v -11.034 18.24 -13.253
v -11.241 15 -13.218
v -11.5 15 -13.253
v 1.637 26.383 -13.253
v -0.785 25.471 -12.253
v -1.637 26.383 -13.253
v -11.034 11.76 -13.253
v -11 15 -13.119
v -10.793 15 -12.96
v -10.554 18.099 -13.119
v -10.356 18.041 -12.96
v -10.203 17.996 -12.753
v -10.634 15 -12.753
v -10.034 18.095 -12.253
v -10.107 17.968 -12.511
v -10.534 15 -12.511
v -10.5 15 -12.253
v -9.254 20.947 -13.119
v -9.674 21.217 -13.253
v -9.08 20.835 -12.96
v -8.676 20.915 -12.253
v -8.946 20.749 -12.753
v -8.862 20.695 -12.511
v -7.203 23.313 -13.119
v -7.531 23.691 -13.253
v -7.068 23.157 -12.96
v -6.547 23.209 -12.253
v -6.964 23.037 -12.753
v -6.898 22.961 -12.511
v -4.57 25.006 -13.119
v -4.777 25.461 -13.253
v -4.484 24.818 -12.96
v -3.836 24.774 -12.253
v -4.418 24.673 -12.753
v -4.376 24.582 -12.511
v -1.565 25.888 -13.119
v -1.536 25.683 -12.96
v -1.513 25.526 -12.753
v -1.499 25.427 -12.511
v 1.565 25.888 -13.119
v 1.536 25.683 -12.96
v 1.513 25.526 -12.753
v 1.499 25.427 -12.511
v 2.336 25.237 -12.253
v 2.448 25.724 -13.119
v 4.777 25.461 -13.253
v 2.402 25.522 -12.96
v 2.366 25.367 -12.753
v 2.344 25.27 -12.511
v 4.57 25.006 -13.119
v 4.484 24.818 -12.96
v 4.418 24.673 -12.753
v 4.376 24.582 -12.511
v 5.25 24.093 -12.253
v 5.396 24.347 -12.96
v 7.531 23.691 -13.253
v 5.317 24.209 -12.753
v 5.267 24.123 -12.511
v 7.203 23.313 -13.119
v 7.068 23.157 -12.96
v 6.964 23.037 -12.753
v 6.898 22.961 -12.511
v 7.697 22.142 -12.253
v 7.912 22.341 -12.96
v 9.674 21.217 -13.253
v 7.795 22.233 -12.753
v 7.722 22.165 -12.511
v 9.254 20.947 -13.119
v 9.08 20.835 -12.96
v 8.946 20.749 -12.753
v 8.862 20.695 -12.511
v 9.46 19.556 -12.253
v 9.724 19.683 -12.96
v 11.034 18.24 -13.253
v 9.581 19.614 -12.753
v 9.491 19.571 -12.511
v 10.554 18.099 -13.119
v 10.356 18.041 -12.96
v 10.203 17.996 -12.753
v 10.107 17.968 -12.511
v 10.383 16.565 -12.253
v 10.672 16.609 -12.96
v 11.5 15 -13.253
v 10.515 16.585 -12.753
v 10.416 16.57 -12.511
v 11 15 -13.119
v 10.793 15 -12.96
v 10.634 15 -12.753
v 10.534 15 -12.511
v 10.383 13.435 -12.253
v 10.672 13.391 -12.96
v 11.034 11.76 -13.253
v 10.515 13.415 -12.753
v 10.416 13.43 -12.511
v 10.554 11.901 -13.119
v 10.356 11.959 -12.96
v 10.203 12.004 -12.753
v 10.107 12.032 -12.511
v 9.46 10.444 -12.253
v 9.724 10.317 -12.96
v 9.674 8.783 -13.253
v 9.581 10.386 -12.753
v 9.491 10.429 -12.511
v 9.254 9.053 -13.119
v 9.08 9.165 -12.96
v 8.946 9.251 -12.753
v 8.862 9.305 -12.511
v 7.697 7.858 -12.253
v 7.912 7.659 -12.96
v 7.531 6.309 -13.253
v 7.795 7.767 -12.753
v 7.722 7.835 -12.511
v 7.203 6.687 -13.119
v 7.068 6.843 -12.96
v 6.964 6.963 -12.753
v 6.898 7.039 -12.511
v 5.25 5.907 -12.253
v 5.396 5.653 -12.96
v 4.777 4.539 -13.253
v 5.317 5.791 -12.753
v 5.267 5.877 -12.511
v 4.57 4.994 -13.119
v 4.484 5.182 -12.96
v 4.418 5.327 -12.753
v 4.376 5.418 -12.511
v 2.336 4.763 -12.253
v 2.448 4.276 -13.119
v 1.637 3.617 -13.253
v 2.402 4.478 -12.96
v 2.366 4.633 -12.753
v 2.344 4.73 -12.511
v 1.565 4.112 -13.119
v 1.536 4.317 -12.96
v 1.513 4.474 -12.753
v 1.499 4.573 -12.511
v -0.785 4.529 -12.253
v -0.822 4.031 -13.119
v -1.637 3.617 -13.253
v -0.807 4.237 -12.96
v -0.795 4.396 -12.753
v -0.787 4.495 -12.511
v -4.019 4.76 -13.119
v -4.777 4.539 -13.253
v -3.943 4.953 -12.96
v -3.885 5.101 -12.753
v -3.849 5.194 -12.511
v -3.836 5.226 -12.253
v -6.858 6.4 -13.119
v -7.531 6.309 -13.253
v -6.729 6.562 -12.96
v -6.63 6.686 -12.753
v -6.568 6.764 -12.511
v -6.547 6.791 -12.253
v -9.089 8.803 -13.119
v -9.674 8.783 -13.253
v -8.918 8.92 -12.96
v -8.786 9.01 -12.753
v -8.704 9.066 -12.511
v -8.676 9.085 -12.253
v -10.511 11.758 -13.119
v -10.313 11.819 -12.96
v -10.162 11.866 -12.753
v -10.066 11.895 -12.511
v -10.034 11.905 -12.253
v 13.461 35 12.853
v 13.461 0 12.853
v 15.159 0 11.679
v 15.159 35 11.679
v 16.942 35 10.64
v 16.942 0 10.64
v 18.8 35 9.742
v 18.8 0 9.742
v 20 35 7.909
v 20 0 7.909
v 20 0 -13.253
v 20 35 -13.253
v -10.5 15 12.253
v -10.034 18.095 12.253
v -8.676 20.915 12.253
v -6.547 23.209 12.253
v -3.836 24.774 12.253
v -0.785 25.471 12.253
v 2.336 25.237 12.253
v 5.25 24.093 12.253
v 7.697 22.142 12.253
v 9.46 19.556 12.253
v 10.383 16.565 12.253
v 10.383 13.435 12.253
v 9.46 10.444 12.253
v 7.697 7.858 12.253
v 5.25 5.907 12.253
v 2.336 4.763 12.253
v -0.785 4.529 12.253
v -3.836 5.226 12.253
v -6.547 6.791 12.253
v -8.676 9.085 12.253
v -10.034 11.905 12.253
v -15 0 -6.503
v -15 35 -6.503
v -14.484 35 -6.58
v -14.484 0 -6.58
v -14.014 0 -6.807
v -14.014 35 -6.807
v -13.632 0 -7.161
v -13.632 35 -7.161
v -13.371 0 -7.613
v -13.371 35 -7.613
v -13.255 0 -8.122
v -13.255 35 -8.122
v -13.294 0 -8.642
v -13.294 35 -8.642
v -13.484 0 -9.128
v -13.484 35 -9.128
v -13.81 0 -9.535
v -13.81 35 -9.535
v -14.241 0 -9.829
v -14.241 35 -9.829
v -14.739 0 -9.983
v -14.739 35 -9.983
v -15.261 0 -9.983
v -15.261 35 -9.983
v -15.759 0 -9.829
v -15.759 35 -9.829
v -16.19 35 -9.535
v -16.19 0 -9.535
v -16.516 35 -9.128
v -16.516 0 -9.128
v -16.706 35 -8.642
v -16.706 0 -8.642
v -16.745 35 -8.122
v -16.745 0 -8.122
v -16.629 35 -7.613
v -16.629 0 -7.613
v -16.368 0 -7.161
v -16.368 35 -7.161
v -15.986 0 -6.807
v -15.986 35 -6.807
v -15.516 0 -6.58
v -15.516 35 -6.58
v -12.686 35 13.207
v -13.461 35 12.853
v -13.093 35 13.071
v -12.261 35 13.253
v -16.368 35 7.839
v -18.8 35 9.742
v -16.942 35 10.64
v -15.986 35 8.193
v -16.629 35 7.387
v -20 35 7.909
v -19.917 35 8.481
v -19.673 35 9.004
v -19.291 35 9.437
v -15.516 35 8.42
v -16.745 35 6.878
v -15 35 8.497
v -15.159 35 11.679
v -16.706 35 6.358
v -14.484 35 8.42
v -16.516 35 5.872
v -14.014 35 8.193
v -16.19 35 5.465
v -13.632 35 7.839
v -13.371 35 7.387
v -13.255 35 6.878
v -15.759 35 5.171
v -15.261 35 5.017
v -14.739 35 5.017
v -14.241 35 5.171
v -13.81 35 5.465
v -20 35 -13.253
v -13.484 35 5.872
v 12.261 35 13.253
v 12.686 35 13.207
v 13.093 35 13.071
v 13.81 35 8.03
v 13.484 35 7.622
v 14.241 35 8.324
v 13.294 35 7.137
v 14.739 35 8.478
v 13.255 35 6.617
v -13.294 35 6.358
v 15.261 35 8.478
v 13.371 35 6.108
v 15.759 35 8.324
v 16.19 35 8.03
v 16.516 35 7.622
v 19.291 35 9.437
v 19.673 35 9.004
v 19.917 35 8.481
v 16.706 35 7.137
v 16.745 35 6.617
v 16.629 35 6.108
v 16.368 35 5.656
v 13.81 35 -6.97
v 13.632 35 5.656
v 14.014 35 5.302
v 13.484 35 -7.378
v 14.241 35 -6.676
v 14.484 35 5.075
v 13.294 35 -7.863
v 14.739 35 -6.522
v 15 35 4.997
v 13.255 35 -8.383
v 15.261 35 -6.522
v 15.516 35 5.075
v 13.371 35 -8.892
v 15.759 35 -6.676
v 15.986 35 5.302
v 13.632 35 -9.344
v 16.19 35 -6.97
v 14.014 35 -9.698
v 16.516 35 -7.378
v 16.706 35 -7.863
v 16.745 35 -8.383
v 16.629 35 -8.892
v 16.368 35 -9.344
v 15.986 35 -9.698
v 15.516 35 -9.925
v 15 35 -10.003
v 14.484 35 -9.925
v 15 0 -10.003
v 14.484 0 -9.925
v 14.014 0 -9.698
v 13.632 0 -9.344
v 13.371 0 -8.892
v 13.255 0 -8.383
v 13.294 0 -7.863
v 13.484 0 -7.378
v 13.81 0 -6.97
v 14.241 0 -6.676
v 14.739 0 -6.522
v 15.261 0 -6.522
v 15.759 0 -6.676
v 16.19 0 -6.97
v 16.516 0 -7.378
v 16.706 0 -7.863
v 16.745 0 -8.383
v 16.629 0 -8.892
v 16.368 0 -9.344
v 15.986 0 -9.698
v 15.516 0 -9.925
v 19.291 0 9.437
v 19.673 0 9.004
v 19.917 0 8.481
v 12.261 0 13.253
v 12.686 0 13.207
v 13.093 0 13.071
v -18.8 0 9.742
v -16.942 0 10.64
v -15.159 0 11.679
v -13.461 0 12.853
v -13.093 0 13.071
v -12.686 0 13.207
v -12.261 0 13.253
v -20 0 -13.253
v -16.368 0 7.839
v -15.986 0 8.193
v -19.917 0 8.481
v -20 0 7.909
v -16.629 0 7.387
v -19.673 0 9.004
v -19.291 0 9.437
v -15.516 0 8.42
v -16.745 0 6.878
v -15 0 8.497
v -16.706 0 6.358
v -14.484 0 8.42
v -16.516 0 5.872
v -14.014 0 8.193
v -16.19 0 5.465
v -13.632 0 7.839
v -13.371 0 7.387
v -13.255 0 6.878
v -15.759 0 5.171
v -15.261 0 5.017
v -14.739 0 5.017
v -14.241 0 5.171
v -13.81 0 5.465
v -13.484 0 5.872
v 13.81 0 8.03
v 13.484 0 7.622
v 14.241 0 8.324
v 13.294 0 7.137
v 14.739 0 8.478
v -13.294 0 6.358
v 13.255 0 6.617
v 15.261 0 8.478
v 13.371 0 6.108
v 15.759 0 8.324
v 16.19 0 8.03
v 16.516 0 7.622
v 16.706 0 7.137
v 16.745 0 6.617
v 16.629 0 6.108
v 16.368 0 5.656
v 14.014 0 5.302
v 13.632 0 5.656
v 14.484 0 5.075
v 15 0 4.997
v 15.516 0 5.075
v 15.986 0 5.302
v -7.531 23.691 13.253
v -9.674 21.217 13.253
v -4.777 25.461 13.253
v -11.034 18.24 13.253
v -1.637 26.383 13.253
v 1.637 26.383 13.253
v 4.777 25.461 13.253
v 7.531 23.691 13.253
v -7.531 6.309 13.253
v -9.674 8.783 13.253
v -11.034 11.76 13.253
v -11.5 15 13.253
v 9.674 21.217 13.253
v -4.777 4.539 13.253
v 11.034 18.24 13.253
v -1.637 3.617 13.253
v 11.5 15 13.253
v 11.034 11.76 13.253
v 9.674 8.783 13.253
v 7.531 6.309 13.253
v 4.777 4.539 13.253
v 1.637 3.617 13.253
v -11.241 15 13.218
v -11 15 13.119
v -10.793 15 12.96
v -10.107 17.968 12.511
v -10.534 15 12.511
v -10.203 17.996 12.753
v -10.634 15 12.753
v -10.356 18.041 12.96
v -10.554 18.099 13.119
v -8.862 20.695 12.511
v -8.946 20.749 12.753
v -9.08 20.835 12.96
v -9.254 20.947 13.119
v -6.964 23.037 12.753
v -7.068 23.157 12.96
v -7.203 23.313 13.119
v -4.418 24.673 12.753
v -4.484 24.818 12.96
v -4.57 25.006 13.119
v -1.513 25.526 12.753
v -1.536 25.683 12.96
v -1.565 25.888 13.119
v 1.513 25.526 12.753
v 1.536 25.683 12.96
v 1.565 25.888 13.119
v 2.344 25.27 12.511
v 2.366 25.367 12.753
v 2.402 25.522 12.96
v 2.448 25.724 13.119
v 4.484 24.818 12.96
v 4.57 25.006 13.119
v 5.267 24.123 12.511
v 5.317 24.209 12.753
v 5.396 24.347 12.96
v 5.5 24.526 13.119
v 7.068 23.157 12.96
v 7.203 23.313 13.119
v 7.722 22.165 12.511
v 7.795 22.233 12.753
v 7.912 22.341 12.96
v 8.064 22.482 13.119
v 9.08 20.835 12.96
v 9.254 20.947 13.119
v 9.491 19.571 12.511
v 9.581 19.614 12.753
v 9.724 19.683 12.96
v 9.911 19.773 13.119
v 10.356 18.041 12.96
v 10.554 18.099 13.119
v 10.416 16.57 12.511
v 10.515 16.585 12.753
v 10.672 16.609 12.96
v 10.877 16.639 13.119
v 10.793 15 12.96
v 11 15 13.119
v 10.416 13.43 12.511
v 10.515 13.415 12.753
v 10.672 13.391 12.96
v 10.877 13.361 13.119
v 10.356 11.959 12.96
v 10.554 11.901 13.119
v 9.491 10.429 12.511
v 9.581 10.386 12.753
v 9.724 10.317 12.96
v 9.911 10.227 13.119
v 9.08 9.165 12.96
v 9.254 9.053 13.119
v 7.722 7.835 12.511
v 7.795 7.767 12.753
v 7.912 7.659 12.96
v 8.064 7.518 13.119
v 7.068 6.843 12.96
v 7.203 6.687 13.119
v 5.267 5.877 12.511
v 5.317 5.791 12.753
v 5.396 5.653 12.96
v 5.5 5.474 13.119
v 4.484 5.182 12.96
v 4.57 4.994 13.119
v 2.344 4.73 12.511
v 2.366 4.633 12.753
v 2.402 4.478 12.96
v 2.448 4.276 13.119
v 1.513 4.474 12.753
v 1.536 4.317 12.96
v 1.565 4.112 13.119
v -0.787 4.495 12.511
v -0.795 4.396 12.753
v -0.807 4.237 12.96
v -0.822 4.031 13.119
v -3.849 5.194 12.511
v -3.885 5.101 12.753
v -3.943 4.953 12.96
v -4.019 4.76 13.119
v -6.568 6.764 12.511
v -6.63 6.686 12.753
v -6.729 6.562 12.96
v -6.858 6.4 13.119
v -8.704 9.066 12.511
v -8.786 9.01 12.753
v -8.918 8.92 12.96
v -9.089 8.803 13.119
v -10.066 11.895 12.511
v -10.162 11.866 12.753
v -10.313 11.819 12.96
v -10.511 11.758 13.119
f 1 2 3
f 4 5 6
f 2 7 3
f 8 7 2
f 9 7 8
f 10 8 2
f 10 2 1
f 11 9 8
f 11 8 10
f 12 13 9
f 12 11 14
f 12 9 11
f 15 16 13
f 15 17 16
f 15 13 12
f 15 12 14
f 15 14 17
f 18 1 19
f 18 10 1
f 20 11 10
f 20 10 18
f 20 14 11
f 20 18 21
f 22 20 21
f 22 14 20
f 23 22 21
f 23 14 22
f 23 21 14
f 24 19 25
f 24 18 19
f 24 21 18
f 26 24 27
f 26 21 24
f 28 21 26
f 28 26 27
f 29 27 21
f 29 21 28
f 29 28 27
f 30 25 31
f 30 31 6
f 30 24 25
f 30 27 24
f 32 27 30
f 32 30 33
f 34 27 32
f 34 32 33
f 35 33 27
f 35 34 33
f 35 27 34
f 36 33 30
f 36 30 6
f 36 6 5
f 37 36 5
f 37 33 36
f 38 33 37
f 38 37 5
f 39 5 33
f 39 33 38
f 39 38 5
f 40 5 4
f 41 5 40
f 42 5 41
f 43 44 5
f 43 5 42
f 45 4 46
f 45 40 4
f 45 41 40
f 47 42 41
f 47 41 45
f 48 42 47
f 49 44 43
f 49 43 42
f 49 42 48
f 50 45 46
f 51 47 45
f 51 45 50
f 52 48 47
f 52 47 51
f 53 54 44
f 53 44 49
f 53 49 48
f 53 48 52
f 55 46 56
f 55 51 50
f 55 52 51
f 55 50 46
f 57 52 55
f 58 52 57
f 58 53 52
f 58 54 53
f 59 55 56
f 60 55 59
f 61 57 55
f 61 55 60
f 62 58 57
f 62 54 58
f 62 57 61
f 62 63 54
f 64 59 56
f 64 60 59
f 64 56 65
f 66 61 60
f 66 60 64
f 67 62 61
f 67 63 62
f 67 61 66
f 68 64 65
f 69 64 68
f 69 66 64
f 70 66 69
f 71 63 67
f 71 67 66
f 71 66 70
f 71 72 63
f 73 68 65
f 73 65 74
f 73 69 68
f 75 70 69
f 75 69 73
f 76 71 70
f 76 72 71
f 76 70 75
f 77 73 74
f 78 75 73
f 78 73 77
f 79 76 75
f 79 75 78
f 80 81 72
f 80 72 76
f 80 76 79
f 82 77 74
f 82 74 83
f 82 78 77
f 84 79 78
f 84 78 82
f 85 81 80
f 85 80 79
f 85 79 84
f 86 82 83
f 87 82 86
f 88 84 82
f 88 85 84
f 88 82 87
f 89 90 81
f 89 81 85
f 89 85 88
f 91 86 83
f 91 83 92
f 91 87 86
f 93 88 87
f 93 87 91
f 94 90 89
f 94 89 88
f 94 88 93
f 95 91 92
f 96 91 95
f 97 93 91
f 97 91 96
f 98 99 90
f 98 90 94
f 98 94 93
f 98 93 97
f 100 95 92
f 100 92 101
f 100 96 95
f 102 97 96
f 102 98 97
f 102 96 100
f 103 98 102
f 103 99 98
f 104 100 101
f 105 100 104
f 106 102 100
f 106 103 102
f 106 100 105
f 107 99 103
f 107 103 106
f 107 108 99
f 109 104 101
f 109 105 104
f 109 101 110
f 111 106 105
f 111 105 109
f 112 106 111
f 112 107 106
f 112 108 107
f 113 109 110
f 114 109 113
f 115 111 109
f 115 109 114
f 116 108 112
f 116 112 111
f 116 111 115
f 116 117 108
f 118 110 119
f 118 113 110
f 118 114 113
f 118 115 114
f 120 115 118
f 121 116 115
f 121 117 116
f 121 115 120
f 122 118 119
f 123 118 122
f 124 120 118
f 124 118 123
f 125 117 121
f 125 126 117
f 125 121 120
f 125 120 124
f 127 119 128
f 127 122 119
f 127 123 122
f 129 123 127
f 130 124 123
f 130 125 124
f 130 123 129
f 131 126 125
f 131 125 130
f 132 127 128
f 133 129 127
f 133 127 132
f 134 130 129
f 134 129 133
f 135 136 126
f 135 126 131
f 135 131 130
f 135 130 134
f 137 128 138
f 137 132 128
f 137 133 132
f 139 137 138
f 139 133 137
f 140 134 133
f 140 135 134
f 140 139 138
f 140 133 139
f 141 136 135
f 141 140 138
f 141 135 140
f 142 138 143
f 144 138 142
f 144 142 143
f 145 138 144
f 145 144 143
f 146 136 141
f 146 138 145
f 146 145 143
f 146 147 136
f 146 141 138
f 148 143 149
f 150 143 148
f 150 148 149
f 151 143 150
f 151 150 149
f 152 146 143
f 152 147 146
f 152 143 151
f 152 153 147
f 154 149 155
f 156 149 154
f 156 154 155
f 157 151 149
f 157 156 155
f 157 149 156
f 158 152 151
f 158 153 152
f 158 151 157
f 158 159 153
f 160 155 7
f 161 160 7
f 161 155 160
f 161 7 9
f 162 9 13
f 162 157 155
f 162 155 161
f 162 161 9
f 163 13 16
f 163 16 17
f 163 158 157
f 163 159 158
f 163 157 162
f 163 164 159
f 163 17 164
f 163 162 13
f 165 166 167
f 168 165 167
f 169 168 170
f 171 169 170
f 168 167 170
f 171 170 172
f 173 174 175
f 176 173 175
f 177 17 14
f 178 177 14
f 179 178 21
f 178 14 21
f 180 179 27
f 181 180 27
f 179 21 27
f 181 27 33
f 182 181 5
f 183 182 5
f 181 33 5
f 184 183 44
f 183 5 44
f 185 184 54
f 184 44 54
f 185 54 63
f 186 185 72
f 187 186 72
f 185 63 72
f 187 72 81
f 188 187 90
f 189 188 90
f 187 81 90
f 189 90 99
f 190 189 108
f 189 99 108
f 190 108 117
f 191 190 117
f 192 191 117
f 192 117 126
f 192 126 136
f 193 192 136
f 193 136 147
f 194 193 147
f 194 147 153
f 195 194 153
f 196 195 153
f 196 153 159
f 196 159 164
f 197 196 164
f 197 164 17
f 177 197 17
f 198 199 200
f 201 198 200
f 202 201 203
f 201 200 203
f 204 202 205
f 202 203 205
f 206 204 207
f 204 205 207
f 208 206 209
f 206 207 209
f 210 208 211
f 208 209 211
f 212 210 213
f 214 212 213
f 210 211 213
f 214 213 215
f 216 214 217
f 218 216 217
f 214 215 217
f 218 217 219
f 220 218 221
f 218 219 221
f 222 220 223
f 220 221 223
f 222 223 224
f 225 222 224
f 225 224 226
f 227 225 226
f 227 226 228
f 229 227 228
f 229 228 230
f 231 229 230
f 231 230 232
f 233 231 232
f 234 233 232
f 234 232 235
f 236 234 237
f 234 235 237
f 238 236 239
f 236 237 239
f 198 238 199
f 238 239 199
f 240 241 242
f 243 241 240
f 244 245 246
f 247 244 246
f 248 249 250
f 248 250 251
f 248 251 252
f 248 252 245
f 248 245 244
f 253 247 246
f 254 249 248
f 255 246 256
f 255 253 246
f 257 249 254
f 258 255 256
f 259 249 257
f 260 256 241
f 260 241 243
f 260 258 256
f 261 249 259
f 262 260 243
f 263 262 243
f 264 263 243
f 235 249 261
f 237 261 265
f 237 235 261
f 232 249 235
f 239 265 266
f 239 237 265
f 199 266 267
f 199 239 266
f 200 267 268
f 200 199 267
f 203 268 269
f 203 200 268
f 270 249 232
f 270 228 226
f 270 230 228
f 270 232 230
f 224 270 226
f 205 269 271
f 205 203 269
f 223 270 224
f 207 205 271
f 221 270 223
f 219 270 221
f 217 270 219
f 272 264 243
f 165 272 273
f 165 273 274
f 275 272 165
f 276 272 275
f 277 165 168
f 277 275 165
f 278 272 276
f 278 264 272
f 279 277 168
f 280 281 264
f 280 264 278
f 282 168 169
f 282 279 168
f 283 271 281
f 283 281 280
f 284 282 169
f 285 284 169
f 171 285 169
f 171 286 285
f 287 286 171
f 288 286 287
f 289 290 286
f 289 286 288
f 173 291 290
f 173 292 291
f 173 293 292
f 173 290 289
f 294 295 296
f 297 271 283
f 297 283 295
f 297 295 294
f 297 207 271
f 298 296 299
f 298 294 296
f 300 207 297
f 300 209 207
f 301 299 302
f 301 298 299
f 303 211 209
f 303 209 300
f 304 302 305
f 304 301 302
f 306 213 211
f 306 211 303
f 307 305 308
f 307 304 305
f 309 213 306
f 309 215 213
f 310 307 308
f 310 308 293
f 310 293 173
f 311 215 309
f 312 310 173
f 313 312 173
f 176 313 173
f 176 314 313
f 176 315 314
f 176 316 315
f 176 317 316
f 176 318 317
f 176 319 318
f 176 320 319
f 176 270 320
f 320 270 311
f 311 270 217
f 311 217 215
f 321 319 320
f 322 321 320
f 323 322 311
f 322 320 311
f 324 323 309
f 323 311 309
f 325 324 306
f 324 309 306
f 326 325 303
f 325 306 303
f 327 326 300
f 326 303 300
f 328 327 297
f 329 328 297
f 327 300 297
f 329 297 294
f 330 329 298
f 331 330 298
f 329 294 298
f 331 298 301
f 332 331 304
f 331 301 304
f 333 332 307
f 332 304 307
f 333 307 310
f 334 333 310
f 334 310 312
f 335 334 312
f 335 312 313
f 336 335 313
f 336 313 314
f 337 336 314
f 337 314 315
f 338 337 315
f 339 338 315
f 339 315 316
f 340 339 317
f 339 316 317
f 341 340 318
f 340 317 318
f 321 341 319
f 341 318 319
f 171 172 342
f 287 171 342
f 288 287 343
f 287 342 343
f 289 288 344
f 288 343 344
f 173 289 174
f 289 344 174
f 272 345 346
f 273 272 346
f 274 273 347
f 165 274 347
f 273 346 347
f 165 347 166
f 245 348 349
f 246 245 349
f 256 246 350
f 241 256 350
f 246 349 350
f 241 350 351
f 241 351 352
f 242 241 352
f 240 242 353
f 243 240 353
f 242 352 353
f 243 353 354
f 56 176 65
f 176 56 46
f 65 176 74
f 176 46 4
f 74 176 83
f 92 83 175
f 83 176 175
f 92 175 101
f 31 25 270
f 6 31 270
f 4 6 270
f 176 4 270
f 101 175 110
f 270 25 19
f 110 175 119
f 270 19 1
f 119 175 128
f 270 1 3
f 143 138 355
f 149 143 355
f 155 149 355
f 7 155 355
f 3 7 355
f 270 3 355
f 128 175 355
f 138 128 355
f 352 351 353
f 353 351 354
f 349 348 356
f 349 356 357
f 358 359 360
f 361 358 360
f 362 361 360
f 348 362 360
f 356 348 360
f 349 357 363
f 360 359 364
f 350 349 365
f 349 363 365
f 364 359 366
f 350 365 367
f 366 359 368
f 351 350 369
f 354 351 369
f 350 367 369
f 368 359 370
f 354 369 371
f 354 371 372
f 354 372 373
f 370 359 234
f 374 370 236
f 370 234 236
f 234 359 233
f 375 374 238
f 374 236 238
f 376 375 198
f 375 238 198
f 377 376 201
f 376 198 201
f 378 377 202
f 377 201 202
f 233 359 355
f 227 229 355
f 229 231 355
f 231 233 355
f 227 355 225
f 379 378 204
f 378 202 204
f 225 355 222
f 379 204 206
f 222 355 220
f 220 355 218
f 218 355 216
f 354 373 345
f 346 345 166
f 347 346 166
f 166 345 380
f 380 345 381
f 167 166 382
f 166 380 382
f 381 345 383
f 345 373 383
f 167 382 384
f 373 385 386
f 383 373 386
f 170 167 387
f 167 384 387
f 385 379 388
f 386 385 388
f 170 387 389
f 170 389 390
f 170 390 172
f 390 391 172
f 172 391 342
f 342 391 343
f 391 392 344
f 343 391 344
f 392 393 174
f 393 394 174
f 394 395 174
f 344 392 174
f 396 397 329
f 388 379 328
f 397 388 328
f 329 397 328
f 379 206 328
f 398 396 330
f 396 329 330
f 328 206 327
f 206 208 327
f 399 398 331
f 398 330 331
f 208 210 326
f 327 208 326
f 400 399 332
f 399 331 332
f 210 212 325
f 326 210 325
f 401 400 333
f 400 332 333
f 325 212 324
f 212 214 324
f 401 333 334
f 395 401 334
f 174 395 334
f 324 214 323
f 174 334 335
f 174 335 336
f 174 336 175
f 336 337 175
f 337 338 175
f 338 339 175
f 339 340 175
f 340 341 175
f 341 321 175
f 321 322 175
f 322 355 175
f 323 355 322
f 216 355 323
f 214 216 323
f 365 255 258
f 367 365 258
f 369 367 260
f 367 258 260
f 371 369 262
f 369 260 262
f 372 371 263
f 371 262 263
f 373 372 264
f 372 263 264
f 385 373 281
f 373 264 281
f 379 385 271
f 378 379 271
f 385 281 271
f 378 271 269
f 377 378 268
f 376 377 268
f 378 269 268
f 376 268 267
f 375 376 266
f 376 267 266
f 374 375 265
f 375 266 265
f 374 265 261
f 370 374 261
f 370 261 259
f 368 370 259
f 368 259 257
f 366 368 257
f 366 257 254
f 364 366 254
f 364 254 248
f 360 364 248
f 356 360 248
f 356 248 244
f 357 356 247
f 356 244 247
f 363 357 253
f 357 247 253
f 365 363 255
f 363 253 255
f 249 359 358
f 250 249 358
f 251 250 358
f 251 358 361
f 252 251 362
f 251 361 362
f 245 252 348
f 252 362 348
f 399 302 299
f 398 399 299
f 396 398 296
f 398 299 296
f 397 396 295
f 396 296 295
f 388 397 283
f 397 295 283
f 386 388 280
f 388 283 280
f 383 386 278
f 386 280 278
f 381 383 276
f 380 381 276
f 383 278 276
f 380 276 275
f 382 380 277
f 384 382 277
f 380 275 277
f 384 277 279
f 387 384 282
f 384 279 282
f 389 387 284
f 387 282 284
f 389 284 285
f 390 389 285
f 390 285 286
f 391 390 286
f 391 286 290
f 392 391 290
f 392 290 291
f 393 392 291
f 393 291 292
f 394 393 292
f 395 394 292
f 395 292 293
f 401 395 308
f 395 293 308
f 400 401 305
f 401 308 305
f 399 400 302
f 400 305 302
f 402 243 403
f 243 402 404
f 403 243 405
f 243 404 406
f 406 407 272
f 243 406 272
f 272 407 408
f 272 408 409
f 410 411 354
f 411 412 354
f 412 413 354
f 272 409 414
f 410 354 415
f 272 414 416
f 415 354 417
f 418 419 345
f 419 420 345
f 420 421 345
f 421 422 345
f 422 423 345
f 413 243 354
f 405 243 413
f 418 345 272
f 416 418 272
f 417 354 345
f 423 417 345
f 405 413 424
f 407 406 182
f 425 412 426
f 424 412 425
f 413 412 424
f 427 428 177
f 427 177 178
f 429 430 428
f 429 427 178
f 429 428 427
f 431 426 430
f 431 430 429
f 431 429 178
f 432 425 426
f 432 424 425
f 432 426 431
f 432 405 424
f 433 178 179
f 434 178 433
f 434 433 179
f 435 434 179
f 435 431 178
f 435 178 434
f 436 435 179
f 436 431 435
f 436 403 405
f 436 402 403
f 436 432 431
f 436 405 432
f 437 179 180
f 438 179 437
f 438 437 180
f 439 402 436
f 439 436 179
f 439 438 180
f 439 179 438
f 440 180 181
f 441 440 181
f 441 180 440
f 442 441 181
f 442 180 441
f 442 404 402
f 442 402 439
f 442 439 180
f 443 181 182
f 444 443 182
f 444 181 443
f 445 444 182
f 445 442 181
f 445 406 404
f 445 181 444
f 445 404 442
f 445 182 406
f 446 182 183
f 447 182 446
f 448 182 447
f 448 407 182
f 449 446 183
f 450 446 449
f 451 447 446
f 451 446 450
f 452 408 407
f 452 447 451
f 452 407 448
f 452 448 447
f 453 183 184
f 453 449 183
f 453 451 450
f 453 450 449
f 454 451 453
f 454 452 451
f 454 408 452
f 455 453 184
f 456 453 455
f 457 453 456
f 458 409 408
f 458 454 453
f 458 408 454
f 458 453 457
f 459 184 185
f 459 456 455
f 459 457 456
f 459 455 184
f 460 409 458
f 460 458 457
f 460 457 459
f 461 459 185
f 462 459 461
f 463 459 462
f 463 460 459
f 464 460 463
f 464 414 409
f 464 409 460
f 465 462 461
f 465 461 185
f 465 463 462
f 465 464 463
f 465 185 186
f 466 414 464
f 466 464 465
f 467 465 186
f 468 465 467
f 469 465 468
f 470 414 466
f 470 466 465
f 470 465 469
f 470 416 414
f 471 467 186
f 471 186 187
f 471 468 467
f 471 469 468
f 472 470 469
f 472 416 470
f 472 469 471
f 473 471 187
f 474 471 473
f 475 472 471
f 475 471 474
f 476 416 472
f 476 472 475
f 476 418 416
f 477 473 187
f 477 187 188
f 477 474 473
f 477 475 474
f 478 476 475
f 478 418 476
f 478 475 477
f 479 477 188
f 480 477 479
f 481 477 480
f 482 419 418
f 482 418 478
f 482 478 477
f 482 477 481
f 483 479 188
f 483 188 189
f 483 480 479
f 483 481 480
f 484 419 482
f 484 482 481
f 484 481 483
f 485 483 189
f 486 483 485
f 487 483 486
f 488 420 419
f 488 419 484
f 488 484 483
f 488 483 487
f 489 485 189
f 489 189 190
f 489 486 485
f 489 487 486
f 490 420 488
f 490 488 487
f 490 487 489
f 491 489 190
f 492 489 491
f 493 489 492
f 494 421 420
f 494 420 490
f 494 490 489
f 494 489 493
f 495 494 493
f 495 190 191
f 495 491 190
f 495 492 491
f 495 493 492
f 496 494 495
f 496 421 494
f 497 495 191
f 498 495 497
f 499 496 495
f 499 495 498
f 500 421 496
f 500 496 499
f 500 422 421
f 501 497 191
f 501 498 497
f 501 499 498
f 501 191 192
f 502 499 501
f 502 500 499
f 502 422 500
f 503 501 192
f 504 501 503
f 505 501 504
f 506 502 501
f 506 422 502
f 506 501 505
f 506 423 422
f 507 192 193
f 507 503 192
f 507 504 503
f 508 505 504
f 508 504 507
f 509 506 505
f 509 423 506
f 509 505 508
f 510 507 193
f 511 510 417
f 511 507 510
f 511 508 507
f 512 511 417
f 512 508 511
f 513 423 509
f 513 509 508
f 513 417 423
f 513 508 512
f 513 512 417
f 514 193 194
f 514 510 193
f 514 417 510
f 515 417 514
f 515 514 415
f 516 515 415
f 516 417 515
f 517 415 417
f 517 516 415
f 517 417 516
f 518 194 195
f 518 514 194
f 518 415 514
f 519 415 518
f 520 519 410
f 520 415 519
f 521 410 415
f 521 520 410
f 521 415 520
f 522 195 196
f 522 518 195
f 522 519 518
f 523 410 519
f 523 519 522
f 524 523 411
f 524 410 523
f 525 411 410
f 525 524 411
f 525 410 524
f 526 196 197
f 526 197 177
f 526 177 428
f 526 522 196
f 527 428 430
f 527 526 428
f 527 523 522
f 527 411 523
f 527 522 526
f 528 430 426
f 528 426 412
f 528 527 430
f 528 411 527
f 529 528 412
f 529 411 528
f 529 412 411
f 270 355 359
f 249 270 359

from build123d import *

# Parameters (mm, degrees)
F_35MM_DEPTH          = 35
CUT_EXTRUDE_1_REACH   = 50.244
SKETCH_2_R            = 10.5
FILLET_1_R            = 1
SKETCH_3_R            = 1.75
CUT_EXTRUDE_3_1_DEPTH = 35


with BuildPart() as part:
    # 草图1 → 高35mm (new body)
    with BuildSketch(Plane(origin=(0, 0, 0), x_dir=(1, 0, 0), z_dir=(0, 1, 0))):
        with BuildLine():
            Line((-20, 13.25250025), (-20, -7.909163894))
            ThreePointArc((-20, -7.909163894), (-19.67340752, -9.004475389), (-18.800292729, -9.742066387))
            ThreePointArc((-18.800292729, -9.742066387), (-16.040253129, -11.142625499), (-13.460543724, -12.852737719))
            ThreePointArc((-13.460543724, -12.852737719), (-12.893128183, -13.149929424), (-12.260860414, -13.25250025))
            Line((-12.260860414, -13.25250025), (12.260860414, -13.25250025))
            ThreePointArc((12.260860414, -13.25250025), (12.893128183, -13.149929424), (13.460543724, -12.852737719))
            ThreePointArc((13.460543724, -12.852737719), (16.040253129, -11.142625499), (18.800292729, -9.742066387))
            ThreePointArc((18.800292729, -9.742066387), (19.67340752, -9.004475389), (20, -7.909163894))
            Line((20, -7.909163894), (20, 13.25250025))
            Line((20, 13.25250025), (-20, 13.25250025))
        make_face()
    extrude(amount=F_35MM_DEPTH)

    # 草图2 → 切除-拉伸1 (cut, up to next)
    with BuildSketch(Plane(origin=(0, 0, -13.25250025), x_dir=(-1, 0, 0), z_dir=(0, 0, -1)), mode=Mode.PRIVATE) as cut_extrude_1_sk1:
        with Locations((0, 15)):
            Circle(SKETCH_2_R)
    cut_extrude_1_tool1 = extrude(cut_extrude_1_sk1.sketch, amount=-CUT_EXTRUDE_1_REACH, mode=Mode.PRIVATE) & part.part
    add(cut_extrude_1_tool1.solids().sort_by_distance((0, 15, -13.2525))[0], mode=Mode.SUBTRACT)

    # 圆角1
    fillet_1_edges = [part.edges().sort_by_distance(p)[0] for p in [
        (10.5, 15, -13.25250025),
        (10.5, 15, 13.25250025),
    ]]
    fillet(fillet_1_edges, radius=FILLET_1_R)

    # 草图3 → φ3.1通孔 (cut)
    with BuildSketch(Plane(origin=(0, 35, 0), x_dir=(1, 0, 0), z_dir=(0, 1, 0))):
        with Locations(Location((-15, 8.25250025, 0), (0, 0, 270))):
            Circle(SKETCH_3_R)
        with Locations(Location((-15, -6.74749975, 0), (0, 0, 270))):
            Circle(SKETCH_3_R)
        with Locations(Location((15, -6.74749975, 0), (0, 0, 90))):
            Circle(SKETCH_3_R)
        with Locations(Location((15, 8.25250025, 0), (0, 0, 90))):
            Circle(SKETCH_3_R)
    extrude(amount=-CUT_EXTRUDE_3_1_DEPTH, mode=Mode.SUBTRACT)


solid = part.part
